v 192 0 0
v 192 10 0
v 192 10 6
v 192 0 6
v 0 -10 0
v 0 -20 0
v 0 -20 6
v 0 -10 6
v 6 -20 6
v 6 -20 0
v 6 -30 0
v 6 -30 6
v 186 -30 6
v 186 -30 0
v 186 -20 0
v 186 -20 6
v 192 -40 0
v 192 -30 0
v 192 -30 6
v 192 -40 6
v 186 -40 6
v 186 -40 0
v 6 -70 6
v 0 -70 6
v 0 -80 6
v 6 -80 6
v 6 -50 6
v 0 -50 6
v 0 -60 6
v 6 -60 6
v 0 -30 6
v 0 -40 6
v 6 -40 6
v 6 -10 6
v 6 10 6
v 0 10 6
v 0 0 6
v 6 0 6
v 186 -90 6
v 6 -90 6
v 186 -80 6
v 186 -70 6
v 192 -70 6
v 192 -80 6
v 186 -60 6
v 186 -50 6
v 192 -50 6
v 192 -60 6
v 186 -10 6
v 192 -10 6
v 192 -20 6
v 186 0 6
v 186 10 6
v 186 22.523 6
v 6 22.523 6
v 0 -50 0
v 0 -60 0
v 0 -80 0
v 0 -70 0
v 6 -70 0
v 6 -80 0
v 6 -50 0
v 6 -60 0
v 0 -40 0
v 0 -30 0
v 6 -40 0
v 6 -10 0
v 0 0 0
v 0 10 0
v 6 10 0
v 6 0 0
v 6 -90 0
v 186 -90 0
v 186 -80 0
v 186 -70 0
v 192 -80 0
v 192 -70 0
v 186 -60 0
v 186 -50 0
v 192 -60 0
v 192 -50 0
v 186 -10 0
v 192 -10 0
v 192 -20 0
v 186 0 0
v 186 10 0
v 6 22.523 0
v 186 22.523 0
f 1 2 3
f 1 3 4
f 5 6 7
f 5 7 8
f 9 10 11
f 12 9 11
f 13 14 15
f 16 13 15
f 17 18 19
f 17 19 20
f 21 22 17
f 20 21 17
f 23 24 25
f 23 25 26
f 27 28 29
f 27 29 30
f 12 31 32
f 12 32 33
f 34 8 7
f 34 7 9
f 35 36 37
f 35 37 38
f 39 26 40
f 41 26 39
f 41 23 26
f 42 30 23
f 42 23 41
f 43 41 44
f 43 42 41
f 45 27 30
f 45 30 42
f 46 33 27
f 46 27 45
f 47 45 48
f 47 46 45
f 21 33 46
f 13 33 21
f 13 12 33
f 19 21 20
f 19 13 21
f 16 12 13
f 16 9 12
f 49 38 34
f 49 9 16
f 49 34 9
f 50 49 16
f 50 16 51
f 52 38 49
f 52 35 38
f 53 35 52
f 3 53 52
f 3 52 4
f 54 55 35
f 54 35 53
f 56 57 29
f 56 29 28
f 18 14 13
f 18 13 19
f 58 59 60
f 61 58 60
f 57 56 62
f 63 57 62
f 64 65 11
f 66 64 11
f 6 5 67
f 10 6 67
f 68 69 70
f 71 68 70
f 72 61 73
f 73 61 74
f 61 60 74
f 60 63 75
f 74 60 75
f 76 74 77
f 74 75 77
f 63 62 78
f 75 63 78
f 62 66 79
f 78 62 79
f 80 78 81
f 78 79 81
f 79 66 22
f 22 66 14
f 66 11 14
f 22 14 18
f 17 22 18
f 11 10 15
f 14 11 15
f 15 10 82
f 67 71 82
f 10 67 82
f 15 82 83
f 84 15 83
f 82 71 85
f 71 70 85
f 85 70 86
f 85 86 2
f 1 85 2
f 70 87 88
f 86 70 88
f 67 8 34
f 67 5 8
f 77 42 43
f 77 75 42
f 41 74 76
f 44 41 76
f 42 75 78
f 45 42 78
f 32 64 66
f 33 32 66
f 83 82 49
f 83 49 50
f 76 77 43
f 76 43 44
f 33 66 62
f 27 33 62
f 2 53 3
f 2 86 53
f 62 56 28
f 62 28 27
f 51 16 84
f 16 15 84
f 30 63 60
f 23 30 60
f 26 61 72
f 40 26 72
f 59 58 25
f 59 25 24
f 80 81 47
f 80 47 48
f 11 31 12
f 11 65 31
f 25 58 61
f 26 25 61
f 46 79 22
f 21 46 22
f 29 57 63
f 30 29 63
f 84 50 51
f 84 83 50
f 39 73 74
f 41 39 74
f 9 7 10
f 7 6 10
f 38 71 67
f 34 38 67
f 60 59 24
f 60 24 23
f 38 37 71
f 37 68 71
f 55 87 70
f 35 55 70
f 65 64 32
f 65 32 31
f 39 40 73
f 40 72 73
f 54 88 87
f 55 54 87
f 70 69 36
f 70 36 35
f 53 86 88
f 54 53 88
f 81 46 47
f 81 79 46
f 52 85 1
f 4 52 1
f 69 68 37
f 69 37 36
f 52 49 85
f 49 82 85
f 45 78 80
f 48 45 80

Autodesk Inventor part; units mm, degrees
ref_plane "YZ Plane" through (0, 0, 0) normal (1, 0, 0) x (0, 1, 0)
ref_plane "XZ Plane" through (0, 0, 0) normal (0, 1, 0) x (-1, 0, 0)
ref_plane "XY Plane" through (0, 0, 0) normal (0, 0, 1) x (1, 0, 0)
sketch "Эскиз1" plane through (0, 0, 0) normal (0, 0, 1) x (1, 0, 0)
  line L0 (0, 0) -> (0, 10) projected
  line L1 (0, 0) -> (6, 0) projected
  line L2 (6, 10) -> (6, 0) projected
  line L3 (0, 10) -> (6, 10) projected
  line L4 (0, -20) -> (0, -10) projected
  line L5 (0, -20) -> (6, -20) projected
  line L6 (6, -10) -> (6, -20) projected
  line L7 (0, -10) -> (6, -10) projected
  line L8 (0, -40) -> (0, -30) projected
  line L9 (0, -40) -> (6, -40) projected
  line L10 (6, -30) -> (6, -40) projected
  line L11 (0, -30) -> (6, -30) projected
  line L12 (0, -60) -> (0, -50) projected
  line L13 (0, -60) -> (6, -60) projected
  line L14 (6, -50) -> (6, -60) projected
  line L15 (0, -50) -> (6, -50) projected
  line L16 (0, -80) -> (0, -70) projected
  line L17 (0, -80) -> (6, -80) projected
  line L18 (6, -70) -> (6, -80) projected
  line L19 (0, -70) -> (6, -70) projected
  line L20 (6, 22.5234) -> (6, 9.9924) projected
  line L21 (6, -80) -> (6, -90) projected
  line L22 (186, 9.9924) -> (186, 22.5234) projected
  line L23 (186, 0) -> (186, 10) projected
  line L24 (186, 0) -> (192, 0) projected
  line L25 (192, 10) -> (192, 0) projected
  line L26 (186, 10) -> (192, 10) projected
  line L27 (186, -20) -> (186, -10) projected
  line L28 (186, -20) -> (192, -20) projected
  line L29 (192, -10) -> (192, -20) projected
  line L30 (186, -10) -> (192, -10) projected
  line L31 (186, -40) -> (186, -30) projected
  line L32 (186, -40) -> (192, -40) projected
  line L33 (192, -30) -> (192, -40) projected
  line L34 (186, -30) -> (192, -30) projected
  line L35 (186, -60) -> (186, -50) projected
  line L36 (186, -60) -> (192, -60) projected
  line L37 (192, -50) -> (192, -60) projected
  line L38 (186, -50) -> (192, -50) projected
  line L39 (186, -80) -> (186, -70) projected
  line L40 (186, -80) -> (192, -80) projected
  line L41 (192, -70) -> (192, -80) projected
  line L42 (186, -70) -> (192, -70) projected
  line L43 (186, -90) -> (186, -80) projected
  line L44 (186, 22.5234) -> (6, 22.5234)
  line L45 (6, 22.5234) -> (6, -90)
  line L46 (6, -90) -> (186, -90)
  line L47 (186, -90) -> (186, 22.5234)
extrude "Выдавливание1" add sketch "Эскиз1" along normal blind 6
properties part number "полуверх"
